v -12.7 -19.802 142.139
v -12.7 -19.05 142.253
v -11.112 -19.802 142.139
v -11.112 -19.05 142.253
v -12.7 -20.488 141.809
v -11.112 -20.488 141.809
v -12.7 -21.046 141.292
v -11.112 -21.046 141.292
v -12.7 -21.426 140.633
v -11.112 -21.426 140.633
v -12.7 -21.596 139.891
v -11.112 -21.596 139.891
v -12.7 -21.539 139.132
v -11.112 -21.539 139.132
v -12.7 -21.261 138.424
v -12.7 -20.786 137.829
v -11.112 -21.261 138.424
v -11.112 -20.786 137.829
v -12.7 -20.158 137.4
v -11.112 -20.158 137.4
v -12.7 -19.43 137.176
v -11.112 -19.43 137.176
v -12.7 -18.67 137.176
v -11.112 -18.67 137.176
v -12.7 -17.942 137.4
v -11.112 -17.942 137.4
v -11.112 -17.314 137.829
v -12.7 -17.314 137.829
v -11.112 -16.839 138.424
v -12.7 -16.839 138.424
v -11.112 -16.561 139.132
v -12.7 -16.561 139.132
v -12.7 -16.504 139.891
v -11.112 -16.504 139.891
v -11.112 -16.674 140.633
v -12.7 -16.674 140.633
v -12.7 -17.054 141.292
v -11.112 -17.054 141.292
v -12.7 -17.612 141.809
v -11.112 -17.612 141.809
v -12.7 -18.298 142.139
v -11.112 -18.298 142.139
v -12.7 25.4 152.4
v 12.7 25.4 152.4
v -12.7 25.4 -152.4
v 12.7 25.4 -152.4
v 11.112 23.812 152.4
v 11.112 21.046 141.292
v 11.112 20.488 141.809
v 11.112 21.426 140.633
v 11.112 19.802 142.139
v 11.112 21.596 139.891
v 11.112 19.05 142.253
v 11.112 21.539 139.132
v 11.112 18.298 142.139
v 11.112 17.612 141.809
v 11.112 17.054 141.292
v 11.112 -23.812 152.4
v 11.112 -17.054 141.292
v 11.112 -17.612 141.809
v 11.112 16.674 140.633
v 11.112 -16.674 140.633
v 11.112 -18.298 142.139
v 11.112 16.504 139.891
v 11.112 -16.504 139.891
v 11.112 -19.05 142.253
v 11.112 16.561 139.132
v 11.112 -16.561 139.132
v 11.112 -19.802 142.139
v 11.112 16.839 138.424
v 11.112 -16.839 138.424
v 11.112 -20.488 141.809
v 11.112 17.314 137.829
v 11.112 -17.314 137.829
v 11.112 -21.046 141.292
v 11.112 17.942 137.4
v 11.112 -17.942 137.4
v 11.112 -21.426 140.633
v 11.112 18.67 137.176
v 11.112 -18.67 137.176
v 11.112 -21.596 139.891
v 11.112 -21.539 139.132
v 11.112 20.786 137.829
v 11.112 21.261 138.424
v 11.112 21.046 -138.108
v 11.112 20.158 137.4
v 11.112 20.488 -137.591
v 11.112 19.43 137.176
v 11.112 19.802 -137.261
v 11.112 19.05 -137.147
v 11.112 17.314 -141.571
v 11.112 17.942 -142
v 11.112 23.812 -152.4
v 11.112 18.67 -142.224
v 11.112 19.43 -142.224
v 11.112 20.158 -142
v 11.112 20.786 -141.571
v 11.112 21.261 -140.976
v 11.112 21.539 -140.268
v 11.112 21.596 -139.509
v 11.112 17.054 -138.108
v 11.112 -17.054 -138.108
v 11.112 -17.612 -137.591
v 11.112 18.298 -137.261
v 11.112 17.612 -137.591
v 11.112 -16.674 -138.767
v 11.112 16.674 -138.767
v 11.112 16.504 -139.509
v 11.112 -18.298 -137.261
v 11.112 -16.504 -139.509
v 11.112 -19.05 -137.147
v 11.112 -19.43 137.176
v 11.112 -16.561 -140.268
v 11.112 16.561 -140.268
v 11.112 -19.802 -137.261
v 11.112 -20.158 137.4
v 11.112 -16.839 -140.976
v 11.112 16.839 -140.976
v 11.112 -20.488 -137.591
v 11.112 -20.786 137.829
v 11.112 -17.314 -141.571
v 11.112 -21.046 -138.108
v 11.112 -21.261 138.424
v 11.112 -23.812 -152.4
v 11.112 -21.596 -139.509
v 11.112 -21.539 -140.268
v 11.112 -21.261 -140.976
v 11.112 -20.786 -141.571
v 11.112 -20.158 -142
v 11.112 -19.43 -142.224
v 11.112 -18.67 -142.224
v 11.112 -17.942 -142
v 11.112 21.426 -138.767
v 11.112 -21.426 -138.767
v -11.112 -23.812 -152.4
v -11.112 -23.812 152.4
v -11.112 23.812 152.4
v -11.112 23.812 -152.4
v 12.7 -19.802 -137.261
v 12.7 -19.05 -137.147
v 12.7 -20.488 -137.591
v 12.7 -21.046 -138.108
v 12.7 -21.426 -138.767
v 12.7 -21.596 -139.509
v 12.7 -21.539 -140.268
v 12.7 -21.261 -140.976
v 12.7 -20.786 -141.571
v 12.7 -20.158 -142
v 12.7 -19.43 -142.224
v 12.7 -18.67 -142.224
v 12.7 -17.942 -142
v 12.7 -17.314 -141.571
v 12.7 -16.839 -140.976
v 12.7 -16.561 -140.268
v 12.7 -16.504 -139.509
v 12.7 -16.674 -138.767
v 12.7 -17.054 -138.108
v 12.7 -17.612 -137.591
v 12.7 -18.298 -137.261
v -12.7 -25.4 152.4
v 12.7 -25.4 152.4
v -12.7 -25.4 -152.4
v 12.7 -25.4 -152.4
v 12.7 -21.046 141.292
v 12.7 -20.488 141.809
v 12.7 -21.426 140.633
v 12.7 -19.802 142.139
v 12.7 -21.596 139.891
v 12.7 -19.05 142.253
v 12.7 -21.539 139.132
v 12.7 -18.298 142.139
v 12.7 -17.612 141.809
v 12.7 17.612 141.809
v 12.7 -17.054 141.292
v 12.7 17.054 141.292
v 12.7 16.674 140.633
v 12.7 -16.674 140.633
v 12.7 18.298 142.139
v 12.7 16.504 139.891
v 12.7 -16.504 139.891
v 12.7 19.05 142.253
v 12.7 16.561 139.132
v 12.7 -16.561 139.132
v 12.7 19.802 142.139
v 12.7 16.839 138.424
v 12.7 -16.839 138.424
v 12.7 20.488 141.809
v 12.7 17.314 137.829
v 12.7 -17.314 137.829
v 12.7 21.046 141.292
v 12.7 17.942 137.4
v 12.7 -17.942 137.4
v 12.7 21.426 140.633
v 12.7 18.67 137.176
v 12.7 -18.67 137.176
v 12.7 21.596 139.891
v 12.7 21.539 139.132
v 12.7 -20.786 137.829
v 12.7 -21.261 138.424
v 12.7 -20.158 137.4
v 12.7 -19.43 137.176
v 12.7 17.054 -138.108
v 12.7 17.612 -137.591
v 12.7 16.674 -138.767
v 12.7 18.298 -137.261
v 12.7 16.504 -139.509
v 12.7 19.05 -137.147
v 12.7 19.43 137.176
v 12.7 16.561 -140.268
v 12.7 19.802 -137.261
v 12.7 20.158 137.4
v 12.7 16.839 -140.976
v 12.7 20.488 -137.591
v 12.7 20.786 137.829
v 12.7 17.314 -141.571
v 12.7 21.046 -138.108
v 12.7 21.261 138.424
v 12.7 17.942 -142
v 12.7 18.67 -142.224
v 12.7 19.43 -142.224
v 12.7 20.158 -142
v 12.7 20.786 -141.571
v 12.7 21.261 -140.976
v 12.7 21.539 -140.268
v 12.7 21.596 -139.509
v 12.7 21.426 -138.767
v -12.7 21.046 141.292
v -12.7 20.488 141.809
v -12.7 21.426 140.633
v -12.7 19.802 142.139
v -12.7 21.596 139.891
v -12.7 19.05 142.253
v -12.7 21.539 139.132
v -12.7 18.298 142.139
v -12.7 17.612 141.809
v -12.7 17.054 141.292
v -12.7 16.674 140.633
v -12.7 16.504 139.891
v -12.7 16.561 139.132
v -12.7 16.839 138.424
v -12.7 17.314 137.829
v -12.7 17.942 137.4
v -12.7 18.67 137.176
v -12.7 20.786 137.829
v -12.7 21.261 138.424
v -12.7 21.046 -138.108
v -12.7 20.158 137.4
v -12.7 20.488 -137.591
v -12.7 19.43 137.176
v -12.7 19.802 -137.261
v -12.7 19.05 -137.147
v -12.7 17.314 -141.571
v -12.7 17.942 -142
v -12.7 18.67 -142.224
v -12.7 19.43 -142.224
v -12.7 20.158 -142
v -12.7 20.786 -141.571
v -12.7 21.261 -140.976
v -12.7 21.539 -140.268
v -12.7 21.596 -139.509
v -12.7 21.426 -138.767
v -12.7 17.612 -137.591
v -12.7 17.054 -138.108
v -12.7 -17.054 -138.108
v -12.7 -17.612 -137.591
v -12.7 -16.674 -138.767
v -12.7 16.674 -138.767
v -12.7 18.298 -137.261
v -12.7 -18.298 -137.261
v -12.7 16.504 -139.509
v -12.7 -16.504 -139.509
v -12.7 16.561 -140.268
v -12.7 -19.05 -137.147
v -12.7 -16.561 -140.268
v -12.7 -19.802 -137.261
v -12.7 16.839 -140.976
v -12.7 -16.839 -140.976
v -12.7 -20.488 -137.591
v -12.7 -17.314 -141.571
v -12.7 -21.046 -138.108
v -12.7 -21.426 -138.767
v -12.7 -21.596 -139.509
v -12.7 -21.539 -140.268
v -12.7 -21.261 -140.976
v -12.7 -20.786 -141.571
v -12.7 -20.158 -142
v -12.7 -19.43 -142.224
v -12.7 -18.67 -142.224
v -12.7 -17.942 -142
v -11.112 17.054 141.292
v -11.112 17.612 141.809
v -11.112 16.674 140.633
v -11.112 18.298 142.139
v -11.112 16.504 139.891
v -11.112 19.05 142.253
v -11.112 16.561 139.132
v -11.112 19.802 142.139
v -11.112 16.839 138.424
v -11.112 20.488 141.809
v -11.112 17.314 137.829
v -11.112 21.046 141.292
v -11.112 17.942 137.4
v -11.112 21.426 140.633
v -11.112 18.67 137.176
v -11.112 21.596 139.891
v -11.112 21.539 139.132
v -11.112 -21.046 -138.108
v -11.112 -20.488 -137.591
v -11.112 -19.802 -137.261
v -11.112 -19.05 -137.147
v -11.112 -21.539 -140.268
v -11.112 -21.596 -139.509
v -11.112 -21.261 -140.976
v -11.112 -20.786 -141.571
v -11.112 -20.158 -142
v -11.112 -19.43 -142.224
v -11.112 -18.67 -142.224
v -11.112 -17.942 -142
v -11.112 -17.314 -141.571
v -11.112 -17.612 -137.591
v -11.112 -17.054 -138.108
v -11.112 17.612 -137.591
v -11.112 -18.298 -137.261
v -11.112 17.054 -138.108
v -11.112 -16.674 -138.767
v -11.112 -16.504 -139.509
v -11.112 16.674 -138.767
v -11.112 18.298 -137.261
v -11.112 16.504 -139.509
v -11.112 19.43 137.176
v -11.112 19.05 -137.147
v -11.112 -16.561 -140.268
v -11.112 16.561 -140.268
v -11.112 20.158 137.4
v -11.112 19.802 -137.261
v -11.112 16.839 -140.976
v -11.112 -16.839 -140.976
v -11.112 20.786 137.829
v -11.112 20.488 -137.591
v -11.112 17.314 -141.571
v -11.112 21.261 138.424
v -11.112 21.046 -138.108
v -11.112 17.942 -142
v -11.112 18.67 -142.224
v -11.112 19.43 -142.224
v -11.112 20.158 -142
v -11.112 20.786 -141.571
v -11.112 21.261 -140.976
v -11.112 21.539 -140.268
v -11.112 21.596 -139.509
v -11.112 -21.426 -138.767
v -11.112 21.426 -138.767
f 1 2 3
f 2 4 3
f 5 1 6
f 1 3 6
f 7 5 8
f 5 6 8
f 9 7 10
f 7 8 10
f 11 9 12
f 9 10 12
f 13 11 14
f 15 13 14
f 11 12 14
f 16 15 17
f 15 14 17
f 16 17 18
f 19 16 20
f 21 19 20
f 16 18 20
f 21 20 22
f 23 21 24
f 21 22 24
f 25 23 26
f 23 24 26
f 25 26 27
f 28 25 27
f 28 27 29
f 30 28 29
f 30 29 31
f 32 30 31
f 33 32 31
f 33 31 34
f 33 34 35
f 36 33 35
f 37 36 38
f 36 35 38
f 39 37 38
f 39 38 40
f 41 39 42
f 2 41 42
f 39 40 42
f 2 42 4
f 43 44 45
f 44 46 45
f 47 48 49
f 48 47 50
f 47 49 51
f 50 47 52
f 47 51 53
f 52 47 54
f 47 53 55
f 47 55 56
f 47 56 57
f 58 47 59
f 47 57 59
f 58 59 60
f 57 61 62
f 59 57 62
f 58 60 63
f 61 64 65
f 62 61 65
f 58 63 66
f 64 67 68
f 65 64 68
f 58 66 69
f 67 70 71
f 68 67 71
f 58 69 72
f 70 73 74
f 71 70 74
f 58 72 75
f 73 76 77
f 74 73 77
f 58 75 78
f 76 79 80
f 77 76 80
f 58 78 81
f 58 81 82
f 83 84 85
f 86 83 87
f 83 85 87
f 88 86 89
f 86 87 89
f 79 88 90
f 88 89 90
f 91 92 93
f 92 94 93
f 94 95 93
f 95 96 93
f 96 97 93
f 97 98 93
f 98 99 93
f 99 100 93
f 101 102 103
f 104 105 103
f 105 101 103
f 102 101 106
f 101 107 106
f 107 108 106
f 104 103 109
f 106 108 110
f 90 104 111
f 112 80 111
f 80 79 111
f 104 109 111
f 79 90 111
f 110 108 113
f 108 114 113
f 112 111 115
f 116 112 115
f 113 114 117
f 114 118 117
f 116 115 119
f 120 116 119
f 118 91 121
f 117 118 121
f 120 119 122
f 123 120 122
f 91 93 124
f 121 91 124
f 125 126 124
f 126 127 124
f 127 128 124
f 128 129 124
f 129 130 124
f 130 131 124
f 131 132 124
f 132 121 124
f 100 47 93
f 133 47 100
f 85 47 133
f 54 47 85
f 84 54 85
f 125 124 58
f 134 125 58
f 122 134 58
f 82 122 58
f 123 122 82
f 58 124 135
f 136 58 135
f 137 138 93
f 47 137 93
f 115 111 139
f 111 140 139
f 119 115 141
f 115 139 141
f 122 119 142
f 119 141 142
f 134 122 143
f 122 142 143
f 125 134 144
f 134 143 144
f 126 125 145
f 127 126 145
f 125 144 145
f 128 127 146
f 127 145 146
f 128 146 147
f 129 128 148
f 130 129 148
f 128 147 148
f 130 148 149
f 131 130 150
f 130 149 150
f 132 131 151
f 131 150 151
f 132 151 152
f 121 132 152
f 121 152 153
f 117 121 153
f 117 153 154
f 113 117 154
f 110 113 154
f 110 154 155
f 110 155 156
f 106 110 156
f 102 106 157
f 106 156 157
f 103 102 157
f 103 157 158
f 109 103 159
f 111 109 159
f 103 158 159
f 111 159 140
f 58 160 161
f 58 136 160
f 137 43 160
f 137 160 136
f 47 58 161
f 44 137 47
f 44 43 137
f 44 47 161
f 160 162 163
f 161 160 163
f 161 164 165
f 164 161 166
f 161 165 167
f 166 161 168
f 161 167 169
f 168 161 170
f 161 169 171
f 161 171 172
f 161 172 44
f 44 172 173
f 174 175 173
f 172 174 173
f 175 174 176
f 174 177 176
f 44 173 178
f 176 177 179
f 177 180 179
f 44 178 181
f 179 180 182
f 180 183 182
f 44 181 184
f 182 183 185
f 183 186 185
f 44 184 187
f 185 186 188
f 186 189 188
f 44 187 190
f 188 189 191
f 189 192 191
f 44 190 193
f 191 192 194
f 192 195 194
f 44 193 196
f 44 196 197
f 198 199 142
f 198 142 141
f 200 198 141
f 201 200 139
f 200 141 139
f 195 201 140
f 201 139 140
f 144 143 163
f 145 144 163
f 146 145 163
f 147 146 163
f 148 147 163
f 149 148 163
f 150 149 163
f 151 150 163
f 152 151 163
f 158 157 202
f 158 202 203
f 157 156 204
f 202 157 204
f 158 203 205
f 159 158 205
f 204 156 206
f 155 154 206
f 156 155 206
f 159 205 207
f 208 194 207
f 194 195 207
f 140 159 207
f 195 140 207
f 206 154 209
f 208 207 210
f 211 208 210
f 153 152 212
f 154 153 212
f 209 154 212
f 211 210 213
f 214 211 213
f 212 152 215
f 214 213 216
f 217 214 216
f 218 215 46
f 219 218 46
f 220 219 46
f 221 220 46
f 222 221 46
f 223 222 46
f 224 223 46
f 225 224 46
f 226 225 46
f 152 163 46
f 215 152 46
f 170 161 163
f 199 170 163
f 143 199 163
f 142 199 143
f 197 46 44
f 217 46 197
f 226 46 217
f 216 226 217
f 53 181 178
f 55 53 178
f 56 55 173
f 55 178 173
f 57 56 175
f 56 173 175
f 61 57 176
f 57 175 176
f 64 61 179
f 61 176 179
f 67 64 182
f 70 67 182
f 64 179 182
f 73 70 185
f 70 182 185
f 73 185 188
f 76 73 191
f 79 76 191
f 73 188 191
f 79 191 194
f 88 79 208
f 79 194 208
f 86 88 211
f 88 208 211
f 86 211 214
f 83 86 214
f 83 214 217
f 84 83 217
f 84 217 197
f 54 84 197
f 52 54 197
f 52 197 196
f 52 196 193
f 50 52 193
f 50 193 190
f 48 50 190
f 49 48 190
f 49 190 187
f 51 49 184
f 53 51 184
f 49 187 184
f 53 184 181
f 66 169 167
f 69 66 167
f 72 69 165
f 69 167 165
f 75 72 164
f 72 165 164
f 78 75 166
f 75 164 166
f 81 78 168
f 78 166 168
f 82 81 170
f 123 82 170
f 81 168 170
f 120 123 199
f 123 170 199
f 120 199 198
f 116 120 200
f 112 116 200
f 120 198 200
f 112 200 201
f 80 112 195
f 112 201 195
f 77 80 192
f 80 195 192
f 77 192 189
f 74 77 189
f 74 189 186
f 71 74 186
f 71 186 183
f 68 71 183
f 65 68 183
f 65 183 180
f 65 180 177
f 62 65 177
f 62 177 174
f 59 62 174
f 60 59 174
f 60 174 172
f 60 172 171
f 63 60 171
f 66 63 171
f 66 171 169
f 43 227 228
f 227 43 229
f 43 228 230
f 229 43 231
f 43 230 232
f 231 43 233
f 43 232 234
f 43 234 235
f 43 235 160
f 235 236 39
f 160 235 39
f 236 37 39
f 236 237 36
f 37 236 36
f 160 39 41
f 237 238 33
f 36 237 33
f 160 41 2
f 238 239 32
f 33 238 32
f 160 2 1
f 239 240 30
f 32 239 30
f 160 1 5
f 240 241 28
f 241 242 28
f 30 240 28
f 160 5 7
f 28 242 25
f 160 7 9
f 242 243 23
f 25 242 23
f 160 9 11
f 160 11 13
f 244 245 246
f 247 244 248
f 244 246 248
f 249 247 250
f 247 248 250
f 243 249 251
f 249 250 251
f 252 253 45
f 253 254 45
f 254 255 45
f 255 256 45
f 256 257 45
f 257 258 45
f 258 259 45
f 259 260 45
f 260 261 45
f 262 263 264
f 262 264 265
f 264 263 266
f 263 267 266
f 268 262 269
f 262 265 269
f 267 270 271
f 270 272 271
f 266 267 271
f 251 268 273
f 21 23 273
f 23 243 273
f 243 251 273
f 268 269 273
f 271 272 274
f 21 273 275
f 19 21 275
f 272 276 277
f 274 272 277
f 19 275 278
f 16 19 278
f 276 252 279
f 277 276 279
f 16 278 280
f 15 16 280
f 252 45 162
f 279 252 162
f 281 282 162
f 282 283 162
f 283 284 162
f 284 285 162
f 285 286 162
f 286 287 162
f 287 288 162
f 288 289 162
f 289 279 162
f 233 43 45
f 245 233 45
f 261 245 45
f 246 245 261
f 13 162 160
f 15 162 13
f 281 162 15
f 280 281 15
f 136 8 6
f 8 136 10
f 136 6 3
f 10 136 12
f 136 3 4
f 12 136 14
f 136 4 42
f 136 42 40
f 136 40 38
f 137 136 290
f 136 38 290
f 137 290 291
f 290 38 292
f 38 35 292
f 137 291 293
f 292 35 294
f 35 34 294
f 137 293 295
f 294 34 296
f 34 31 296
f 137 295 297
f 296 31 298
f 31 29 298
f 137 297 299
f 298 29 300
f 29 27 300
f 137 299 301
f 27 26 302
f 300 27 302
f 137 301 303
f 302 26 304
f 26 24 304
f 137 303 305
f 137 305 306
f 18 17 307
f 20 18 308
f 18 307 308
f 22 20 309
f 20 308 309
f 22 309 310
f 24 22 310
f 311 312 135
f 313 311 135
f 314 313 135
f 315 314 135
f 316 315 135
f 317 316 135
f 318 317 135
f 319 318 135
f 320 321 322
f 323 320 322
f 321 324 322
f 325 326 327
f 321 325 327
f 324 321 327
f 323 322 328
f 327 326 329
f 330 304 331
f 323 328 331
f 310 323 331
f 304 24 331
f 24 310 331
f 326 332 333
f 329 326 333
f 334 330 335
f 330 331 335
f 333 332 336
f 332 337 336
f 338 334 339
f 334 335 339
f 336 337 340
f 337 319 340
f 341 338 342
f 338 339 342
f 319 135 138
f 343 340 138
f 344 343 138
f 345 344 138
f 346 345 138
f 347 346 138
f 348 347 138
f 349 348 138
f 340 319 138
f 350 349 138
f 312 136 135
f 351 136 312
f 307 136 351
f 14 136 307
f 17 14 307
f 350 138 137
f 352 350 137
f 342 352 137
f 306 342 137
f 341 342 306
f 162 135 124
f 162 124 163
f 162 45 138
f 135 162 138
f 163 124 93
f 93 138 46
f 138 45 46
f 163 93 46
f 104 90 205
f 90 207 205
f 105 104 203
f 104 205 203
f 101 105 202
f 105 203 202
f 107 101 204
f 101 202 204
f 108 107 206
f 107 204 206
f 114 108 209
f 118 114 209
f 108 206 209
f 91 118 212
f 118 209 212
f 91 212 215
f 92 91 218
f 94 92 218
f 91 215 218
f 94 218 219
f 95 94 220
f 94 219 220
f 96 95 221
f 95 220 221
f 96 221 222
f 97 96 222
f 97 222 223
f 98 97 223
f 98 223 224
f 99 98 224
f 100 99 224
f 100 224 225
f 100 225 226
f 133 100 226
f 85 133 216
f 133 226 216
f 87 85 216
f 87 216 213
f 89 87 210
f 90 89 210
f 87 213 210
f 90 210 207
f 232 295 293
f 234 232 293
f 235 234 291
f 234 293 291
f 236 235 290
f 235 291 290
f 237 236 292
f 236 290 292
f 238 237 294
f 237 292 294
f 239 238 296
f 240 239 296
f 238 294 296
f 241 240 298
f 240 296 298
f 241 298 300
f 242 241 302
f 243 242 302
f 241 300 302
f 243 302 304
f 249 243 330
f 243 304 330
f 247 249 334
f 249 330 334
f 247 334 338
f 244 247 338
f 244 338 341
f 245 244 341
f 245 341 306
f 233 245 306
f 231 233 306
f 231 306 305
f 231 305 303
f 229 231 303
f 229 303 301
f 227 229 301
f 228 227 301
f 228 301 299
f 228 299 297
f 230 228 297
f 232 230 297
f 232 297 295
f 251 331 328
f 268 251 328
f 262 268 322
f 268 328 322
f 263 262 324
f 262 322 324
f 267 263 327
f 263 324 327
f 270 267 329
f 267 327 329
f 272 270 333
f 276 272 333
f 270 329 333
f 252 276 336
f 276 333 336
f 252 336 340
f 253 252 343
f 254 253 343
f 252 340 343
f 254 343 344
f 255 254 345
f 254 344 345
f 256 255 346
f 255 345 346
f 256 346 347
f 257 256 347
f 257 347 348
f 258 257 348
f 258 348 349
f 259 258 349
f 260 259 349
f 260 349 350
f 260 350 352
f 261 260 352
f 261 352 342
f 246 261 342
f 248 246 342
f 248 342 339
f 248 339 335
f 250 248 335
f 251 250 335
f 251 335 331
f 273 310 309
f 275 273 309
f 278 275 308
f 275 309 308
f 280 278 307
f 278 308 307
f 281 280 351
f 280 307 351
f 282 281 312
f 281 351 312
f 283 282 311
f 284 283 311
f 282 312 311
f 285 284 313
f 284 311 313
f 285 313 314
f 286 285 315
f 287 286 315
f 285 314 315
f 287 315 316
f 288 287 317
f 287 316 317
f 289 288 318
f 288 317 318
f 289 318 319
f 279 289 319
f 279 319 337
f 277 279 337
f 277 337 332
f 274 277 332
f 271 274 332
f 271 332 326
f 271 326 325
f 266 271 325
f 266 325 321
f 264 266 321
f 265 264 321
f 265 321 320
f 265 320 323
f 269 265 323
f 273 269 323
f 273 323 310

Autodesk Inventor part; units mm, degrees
ref_plane "YZ Plane" through (0, 0, 0) normal (1, 0, 0) x (0, 1, 0)
ref_plane "XZ Plane" through (0, 0, 0) normal (0, 1, 0) x (-1, 0, 0)
ref_plane "XY Plane" through (0, 0, 0) normal (0, 0, 1) x (1, 0, 0)
sketch "Sketch1" plane through (0, 0, 0) normal (0, 0, 1) x (1, 0, 0)
  line L0 (-12.7, -25.4) -> (12.7, -25.4)
  line L1 (12.7, -25.4) -> (12.7, 25.4)
  line L2 (12.7, 25.4) -> (-12.7, 25.4)
  line L3 (-12.7, 25.4) -> (-12.7, -25.4)
  line L4 (-12.7, -25.4) -> (12.7, 25.4) construction
  line L5 (12.7, -25.4) -> (-12.7, 25.4) construction
  line L6 (-11.1125, 23.8125) -> (11.1125, 23.8125)
  line L7 (11.1125, 23.8125) -> (11.1125, -23.8125)
  line L8 (11.1125, -23.8125) -> (-11.1125, -23.8125)
  line L9 (-11.1125, -23.8125) -> (-11.1125, 23.8125)
  point P0 (0, 0)
  dimension "width" = 25.4
  dimension "height" = 50.8
  dimension "thickness" = 1.5875
extrude "Extrusion1" add sketch "Sketch1" along normal mid plane 304.8
sketch "Sketch2" plane through (-12.7, -25.4, 152.4) normal (-1, 0, 0) x (0, 0, 1)
  line L0 (-292.1, 44.45) -> (-292.1, 6.35) construction
  line L1 (-304.8, 0) -> (-304.8, 50.8) construction
  line L2 (0, 50.8) -> (0, 0) construction
  point P0 (-152.4, 25.4)
  point P1 (-12.7, 6.35)
  point P2 (-12.7, 44.45)
  point P3 (-292.1, 25.4)
  dimension "d5" = 12.7
  dimension "d6" = 12.7
  dimension "d7" = 38.1
hole "Hole1" at (-12.7, 19.05, -139.7) at (-12.7, -19.05, -139.7) at (-12.7, -19.05, 139.7) at (-12.7, 19.05, 139.7) direction (1, 0, 0) diameter 5.1054 end through all clearance for "Flat Head Machine Screw (82)" size "#10" standard "Ansi Unified Screw Threads"
properties part number "CL7-015" material "Aluminum 6061"
